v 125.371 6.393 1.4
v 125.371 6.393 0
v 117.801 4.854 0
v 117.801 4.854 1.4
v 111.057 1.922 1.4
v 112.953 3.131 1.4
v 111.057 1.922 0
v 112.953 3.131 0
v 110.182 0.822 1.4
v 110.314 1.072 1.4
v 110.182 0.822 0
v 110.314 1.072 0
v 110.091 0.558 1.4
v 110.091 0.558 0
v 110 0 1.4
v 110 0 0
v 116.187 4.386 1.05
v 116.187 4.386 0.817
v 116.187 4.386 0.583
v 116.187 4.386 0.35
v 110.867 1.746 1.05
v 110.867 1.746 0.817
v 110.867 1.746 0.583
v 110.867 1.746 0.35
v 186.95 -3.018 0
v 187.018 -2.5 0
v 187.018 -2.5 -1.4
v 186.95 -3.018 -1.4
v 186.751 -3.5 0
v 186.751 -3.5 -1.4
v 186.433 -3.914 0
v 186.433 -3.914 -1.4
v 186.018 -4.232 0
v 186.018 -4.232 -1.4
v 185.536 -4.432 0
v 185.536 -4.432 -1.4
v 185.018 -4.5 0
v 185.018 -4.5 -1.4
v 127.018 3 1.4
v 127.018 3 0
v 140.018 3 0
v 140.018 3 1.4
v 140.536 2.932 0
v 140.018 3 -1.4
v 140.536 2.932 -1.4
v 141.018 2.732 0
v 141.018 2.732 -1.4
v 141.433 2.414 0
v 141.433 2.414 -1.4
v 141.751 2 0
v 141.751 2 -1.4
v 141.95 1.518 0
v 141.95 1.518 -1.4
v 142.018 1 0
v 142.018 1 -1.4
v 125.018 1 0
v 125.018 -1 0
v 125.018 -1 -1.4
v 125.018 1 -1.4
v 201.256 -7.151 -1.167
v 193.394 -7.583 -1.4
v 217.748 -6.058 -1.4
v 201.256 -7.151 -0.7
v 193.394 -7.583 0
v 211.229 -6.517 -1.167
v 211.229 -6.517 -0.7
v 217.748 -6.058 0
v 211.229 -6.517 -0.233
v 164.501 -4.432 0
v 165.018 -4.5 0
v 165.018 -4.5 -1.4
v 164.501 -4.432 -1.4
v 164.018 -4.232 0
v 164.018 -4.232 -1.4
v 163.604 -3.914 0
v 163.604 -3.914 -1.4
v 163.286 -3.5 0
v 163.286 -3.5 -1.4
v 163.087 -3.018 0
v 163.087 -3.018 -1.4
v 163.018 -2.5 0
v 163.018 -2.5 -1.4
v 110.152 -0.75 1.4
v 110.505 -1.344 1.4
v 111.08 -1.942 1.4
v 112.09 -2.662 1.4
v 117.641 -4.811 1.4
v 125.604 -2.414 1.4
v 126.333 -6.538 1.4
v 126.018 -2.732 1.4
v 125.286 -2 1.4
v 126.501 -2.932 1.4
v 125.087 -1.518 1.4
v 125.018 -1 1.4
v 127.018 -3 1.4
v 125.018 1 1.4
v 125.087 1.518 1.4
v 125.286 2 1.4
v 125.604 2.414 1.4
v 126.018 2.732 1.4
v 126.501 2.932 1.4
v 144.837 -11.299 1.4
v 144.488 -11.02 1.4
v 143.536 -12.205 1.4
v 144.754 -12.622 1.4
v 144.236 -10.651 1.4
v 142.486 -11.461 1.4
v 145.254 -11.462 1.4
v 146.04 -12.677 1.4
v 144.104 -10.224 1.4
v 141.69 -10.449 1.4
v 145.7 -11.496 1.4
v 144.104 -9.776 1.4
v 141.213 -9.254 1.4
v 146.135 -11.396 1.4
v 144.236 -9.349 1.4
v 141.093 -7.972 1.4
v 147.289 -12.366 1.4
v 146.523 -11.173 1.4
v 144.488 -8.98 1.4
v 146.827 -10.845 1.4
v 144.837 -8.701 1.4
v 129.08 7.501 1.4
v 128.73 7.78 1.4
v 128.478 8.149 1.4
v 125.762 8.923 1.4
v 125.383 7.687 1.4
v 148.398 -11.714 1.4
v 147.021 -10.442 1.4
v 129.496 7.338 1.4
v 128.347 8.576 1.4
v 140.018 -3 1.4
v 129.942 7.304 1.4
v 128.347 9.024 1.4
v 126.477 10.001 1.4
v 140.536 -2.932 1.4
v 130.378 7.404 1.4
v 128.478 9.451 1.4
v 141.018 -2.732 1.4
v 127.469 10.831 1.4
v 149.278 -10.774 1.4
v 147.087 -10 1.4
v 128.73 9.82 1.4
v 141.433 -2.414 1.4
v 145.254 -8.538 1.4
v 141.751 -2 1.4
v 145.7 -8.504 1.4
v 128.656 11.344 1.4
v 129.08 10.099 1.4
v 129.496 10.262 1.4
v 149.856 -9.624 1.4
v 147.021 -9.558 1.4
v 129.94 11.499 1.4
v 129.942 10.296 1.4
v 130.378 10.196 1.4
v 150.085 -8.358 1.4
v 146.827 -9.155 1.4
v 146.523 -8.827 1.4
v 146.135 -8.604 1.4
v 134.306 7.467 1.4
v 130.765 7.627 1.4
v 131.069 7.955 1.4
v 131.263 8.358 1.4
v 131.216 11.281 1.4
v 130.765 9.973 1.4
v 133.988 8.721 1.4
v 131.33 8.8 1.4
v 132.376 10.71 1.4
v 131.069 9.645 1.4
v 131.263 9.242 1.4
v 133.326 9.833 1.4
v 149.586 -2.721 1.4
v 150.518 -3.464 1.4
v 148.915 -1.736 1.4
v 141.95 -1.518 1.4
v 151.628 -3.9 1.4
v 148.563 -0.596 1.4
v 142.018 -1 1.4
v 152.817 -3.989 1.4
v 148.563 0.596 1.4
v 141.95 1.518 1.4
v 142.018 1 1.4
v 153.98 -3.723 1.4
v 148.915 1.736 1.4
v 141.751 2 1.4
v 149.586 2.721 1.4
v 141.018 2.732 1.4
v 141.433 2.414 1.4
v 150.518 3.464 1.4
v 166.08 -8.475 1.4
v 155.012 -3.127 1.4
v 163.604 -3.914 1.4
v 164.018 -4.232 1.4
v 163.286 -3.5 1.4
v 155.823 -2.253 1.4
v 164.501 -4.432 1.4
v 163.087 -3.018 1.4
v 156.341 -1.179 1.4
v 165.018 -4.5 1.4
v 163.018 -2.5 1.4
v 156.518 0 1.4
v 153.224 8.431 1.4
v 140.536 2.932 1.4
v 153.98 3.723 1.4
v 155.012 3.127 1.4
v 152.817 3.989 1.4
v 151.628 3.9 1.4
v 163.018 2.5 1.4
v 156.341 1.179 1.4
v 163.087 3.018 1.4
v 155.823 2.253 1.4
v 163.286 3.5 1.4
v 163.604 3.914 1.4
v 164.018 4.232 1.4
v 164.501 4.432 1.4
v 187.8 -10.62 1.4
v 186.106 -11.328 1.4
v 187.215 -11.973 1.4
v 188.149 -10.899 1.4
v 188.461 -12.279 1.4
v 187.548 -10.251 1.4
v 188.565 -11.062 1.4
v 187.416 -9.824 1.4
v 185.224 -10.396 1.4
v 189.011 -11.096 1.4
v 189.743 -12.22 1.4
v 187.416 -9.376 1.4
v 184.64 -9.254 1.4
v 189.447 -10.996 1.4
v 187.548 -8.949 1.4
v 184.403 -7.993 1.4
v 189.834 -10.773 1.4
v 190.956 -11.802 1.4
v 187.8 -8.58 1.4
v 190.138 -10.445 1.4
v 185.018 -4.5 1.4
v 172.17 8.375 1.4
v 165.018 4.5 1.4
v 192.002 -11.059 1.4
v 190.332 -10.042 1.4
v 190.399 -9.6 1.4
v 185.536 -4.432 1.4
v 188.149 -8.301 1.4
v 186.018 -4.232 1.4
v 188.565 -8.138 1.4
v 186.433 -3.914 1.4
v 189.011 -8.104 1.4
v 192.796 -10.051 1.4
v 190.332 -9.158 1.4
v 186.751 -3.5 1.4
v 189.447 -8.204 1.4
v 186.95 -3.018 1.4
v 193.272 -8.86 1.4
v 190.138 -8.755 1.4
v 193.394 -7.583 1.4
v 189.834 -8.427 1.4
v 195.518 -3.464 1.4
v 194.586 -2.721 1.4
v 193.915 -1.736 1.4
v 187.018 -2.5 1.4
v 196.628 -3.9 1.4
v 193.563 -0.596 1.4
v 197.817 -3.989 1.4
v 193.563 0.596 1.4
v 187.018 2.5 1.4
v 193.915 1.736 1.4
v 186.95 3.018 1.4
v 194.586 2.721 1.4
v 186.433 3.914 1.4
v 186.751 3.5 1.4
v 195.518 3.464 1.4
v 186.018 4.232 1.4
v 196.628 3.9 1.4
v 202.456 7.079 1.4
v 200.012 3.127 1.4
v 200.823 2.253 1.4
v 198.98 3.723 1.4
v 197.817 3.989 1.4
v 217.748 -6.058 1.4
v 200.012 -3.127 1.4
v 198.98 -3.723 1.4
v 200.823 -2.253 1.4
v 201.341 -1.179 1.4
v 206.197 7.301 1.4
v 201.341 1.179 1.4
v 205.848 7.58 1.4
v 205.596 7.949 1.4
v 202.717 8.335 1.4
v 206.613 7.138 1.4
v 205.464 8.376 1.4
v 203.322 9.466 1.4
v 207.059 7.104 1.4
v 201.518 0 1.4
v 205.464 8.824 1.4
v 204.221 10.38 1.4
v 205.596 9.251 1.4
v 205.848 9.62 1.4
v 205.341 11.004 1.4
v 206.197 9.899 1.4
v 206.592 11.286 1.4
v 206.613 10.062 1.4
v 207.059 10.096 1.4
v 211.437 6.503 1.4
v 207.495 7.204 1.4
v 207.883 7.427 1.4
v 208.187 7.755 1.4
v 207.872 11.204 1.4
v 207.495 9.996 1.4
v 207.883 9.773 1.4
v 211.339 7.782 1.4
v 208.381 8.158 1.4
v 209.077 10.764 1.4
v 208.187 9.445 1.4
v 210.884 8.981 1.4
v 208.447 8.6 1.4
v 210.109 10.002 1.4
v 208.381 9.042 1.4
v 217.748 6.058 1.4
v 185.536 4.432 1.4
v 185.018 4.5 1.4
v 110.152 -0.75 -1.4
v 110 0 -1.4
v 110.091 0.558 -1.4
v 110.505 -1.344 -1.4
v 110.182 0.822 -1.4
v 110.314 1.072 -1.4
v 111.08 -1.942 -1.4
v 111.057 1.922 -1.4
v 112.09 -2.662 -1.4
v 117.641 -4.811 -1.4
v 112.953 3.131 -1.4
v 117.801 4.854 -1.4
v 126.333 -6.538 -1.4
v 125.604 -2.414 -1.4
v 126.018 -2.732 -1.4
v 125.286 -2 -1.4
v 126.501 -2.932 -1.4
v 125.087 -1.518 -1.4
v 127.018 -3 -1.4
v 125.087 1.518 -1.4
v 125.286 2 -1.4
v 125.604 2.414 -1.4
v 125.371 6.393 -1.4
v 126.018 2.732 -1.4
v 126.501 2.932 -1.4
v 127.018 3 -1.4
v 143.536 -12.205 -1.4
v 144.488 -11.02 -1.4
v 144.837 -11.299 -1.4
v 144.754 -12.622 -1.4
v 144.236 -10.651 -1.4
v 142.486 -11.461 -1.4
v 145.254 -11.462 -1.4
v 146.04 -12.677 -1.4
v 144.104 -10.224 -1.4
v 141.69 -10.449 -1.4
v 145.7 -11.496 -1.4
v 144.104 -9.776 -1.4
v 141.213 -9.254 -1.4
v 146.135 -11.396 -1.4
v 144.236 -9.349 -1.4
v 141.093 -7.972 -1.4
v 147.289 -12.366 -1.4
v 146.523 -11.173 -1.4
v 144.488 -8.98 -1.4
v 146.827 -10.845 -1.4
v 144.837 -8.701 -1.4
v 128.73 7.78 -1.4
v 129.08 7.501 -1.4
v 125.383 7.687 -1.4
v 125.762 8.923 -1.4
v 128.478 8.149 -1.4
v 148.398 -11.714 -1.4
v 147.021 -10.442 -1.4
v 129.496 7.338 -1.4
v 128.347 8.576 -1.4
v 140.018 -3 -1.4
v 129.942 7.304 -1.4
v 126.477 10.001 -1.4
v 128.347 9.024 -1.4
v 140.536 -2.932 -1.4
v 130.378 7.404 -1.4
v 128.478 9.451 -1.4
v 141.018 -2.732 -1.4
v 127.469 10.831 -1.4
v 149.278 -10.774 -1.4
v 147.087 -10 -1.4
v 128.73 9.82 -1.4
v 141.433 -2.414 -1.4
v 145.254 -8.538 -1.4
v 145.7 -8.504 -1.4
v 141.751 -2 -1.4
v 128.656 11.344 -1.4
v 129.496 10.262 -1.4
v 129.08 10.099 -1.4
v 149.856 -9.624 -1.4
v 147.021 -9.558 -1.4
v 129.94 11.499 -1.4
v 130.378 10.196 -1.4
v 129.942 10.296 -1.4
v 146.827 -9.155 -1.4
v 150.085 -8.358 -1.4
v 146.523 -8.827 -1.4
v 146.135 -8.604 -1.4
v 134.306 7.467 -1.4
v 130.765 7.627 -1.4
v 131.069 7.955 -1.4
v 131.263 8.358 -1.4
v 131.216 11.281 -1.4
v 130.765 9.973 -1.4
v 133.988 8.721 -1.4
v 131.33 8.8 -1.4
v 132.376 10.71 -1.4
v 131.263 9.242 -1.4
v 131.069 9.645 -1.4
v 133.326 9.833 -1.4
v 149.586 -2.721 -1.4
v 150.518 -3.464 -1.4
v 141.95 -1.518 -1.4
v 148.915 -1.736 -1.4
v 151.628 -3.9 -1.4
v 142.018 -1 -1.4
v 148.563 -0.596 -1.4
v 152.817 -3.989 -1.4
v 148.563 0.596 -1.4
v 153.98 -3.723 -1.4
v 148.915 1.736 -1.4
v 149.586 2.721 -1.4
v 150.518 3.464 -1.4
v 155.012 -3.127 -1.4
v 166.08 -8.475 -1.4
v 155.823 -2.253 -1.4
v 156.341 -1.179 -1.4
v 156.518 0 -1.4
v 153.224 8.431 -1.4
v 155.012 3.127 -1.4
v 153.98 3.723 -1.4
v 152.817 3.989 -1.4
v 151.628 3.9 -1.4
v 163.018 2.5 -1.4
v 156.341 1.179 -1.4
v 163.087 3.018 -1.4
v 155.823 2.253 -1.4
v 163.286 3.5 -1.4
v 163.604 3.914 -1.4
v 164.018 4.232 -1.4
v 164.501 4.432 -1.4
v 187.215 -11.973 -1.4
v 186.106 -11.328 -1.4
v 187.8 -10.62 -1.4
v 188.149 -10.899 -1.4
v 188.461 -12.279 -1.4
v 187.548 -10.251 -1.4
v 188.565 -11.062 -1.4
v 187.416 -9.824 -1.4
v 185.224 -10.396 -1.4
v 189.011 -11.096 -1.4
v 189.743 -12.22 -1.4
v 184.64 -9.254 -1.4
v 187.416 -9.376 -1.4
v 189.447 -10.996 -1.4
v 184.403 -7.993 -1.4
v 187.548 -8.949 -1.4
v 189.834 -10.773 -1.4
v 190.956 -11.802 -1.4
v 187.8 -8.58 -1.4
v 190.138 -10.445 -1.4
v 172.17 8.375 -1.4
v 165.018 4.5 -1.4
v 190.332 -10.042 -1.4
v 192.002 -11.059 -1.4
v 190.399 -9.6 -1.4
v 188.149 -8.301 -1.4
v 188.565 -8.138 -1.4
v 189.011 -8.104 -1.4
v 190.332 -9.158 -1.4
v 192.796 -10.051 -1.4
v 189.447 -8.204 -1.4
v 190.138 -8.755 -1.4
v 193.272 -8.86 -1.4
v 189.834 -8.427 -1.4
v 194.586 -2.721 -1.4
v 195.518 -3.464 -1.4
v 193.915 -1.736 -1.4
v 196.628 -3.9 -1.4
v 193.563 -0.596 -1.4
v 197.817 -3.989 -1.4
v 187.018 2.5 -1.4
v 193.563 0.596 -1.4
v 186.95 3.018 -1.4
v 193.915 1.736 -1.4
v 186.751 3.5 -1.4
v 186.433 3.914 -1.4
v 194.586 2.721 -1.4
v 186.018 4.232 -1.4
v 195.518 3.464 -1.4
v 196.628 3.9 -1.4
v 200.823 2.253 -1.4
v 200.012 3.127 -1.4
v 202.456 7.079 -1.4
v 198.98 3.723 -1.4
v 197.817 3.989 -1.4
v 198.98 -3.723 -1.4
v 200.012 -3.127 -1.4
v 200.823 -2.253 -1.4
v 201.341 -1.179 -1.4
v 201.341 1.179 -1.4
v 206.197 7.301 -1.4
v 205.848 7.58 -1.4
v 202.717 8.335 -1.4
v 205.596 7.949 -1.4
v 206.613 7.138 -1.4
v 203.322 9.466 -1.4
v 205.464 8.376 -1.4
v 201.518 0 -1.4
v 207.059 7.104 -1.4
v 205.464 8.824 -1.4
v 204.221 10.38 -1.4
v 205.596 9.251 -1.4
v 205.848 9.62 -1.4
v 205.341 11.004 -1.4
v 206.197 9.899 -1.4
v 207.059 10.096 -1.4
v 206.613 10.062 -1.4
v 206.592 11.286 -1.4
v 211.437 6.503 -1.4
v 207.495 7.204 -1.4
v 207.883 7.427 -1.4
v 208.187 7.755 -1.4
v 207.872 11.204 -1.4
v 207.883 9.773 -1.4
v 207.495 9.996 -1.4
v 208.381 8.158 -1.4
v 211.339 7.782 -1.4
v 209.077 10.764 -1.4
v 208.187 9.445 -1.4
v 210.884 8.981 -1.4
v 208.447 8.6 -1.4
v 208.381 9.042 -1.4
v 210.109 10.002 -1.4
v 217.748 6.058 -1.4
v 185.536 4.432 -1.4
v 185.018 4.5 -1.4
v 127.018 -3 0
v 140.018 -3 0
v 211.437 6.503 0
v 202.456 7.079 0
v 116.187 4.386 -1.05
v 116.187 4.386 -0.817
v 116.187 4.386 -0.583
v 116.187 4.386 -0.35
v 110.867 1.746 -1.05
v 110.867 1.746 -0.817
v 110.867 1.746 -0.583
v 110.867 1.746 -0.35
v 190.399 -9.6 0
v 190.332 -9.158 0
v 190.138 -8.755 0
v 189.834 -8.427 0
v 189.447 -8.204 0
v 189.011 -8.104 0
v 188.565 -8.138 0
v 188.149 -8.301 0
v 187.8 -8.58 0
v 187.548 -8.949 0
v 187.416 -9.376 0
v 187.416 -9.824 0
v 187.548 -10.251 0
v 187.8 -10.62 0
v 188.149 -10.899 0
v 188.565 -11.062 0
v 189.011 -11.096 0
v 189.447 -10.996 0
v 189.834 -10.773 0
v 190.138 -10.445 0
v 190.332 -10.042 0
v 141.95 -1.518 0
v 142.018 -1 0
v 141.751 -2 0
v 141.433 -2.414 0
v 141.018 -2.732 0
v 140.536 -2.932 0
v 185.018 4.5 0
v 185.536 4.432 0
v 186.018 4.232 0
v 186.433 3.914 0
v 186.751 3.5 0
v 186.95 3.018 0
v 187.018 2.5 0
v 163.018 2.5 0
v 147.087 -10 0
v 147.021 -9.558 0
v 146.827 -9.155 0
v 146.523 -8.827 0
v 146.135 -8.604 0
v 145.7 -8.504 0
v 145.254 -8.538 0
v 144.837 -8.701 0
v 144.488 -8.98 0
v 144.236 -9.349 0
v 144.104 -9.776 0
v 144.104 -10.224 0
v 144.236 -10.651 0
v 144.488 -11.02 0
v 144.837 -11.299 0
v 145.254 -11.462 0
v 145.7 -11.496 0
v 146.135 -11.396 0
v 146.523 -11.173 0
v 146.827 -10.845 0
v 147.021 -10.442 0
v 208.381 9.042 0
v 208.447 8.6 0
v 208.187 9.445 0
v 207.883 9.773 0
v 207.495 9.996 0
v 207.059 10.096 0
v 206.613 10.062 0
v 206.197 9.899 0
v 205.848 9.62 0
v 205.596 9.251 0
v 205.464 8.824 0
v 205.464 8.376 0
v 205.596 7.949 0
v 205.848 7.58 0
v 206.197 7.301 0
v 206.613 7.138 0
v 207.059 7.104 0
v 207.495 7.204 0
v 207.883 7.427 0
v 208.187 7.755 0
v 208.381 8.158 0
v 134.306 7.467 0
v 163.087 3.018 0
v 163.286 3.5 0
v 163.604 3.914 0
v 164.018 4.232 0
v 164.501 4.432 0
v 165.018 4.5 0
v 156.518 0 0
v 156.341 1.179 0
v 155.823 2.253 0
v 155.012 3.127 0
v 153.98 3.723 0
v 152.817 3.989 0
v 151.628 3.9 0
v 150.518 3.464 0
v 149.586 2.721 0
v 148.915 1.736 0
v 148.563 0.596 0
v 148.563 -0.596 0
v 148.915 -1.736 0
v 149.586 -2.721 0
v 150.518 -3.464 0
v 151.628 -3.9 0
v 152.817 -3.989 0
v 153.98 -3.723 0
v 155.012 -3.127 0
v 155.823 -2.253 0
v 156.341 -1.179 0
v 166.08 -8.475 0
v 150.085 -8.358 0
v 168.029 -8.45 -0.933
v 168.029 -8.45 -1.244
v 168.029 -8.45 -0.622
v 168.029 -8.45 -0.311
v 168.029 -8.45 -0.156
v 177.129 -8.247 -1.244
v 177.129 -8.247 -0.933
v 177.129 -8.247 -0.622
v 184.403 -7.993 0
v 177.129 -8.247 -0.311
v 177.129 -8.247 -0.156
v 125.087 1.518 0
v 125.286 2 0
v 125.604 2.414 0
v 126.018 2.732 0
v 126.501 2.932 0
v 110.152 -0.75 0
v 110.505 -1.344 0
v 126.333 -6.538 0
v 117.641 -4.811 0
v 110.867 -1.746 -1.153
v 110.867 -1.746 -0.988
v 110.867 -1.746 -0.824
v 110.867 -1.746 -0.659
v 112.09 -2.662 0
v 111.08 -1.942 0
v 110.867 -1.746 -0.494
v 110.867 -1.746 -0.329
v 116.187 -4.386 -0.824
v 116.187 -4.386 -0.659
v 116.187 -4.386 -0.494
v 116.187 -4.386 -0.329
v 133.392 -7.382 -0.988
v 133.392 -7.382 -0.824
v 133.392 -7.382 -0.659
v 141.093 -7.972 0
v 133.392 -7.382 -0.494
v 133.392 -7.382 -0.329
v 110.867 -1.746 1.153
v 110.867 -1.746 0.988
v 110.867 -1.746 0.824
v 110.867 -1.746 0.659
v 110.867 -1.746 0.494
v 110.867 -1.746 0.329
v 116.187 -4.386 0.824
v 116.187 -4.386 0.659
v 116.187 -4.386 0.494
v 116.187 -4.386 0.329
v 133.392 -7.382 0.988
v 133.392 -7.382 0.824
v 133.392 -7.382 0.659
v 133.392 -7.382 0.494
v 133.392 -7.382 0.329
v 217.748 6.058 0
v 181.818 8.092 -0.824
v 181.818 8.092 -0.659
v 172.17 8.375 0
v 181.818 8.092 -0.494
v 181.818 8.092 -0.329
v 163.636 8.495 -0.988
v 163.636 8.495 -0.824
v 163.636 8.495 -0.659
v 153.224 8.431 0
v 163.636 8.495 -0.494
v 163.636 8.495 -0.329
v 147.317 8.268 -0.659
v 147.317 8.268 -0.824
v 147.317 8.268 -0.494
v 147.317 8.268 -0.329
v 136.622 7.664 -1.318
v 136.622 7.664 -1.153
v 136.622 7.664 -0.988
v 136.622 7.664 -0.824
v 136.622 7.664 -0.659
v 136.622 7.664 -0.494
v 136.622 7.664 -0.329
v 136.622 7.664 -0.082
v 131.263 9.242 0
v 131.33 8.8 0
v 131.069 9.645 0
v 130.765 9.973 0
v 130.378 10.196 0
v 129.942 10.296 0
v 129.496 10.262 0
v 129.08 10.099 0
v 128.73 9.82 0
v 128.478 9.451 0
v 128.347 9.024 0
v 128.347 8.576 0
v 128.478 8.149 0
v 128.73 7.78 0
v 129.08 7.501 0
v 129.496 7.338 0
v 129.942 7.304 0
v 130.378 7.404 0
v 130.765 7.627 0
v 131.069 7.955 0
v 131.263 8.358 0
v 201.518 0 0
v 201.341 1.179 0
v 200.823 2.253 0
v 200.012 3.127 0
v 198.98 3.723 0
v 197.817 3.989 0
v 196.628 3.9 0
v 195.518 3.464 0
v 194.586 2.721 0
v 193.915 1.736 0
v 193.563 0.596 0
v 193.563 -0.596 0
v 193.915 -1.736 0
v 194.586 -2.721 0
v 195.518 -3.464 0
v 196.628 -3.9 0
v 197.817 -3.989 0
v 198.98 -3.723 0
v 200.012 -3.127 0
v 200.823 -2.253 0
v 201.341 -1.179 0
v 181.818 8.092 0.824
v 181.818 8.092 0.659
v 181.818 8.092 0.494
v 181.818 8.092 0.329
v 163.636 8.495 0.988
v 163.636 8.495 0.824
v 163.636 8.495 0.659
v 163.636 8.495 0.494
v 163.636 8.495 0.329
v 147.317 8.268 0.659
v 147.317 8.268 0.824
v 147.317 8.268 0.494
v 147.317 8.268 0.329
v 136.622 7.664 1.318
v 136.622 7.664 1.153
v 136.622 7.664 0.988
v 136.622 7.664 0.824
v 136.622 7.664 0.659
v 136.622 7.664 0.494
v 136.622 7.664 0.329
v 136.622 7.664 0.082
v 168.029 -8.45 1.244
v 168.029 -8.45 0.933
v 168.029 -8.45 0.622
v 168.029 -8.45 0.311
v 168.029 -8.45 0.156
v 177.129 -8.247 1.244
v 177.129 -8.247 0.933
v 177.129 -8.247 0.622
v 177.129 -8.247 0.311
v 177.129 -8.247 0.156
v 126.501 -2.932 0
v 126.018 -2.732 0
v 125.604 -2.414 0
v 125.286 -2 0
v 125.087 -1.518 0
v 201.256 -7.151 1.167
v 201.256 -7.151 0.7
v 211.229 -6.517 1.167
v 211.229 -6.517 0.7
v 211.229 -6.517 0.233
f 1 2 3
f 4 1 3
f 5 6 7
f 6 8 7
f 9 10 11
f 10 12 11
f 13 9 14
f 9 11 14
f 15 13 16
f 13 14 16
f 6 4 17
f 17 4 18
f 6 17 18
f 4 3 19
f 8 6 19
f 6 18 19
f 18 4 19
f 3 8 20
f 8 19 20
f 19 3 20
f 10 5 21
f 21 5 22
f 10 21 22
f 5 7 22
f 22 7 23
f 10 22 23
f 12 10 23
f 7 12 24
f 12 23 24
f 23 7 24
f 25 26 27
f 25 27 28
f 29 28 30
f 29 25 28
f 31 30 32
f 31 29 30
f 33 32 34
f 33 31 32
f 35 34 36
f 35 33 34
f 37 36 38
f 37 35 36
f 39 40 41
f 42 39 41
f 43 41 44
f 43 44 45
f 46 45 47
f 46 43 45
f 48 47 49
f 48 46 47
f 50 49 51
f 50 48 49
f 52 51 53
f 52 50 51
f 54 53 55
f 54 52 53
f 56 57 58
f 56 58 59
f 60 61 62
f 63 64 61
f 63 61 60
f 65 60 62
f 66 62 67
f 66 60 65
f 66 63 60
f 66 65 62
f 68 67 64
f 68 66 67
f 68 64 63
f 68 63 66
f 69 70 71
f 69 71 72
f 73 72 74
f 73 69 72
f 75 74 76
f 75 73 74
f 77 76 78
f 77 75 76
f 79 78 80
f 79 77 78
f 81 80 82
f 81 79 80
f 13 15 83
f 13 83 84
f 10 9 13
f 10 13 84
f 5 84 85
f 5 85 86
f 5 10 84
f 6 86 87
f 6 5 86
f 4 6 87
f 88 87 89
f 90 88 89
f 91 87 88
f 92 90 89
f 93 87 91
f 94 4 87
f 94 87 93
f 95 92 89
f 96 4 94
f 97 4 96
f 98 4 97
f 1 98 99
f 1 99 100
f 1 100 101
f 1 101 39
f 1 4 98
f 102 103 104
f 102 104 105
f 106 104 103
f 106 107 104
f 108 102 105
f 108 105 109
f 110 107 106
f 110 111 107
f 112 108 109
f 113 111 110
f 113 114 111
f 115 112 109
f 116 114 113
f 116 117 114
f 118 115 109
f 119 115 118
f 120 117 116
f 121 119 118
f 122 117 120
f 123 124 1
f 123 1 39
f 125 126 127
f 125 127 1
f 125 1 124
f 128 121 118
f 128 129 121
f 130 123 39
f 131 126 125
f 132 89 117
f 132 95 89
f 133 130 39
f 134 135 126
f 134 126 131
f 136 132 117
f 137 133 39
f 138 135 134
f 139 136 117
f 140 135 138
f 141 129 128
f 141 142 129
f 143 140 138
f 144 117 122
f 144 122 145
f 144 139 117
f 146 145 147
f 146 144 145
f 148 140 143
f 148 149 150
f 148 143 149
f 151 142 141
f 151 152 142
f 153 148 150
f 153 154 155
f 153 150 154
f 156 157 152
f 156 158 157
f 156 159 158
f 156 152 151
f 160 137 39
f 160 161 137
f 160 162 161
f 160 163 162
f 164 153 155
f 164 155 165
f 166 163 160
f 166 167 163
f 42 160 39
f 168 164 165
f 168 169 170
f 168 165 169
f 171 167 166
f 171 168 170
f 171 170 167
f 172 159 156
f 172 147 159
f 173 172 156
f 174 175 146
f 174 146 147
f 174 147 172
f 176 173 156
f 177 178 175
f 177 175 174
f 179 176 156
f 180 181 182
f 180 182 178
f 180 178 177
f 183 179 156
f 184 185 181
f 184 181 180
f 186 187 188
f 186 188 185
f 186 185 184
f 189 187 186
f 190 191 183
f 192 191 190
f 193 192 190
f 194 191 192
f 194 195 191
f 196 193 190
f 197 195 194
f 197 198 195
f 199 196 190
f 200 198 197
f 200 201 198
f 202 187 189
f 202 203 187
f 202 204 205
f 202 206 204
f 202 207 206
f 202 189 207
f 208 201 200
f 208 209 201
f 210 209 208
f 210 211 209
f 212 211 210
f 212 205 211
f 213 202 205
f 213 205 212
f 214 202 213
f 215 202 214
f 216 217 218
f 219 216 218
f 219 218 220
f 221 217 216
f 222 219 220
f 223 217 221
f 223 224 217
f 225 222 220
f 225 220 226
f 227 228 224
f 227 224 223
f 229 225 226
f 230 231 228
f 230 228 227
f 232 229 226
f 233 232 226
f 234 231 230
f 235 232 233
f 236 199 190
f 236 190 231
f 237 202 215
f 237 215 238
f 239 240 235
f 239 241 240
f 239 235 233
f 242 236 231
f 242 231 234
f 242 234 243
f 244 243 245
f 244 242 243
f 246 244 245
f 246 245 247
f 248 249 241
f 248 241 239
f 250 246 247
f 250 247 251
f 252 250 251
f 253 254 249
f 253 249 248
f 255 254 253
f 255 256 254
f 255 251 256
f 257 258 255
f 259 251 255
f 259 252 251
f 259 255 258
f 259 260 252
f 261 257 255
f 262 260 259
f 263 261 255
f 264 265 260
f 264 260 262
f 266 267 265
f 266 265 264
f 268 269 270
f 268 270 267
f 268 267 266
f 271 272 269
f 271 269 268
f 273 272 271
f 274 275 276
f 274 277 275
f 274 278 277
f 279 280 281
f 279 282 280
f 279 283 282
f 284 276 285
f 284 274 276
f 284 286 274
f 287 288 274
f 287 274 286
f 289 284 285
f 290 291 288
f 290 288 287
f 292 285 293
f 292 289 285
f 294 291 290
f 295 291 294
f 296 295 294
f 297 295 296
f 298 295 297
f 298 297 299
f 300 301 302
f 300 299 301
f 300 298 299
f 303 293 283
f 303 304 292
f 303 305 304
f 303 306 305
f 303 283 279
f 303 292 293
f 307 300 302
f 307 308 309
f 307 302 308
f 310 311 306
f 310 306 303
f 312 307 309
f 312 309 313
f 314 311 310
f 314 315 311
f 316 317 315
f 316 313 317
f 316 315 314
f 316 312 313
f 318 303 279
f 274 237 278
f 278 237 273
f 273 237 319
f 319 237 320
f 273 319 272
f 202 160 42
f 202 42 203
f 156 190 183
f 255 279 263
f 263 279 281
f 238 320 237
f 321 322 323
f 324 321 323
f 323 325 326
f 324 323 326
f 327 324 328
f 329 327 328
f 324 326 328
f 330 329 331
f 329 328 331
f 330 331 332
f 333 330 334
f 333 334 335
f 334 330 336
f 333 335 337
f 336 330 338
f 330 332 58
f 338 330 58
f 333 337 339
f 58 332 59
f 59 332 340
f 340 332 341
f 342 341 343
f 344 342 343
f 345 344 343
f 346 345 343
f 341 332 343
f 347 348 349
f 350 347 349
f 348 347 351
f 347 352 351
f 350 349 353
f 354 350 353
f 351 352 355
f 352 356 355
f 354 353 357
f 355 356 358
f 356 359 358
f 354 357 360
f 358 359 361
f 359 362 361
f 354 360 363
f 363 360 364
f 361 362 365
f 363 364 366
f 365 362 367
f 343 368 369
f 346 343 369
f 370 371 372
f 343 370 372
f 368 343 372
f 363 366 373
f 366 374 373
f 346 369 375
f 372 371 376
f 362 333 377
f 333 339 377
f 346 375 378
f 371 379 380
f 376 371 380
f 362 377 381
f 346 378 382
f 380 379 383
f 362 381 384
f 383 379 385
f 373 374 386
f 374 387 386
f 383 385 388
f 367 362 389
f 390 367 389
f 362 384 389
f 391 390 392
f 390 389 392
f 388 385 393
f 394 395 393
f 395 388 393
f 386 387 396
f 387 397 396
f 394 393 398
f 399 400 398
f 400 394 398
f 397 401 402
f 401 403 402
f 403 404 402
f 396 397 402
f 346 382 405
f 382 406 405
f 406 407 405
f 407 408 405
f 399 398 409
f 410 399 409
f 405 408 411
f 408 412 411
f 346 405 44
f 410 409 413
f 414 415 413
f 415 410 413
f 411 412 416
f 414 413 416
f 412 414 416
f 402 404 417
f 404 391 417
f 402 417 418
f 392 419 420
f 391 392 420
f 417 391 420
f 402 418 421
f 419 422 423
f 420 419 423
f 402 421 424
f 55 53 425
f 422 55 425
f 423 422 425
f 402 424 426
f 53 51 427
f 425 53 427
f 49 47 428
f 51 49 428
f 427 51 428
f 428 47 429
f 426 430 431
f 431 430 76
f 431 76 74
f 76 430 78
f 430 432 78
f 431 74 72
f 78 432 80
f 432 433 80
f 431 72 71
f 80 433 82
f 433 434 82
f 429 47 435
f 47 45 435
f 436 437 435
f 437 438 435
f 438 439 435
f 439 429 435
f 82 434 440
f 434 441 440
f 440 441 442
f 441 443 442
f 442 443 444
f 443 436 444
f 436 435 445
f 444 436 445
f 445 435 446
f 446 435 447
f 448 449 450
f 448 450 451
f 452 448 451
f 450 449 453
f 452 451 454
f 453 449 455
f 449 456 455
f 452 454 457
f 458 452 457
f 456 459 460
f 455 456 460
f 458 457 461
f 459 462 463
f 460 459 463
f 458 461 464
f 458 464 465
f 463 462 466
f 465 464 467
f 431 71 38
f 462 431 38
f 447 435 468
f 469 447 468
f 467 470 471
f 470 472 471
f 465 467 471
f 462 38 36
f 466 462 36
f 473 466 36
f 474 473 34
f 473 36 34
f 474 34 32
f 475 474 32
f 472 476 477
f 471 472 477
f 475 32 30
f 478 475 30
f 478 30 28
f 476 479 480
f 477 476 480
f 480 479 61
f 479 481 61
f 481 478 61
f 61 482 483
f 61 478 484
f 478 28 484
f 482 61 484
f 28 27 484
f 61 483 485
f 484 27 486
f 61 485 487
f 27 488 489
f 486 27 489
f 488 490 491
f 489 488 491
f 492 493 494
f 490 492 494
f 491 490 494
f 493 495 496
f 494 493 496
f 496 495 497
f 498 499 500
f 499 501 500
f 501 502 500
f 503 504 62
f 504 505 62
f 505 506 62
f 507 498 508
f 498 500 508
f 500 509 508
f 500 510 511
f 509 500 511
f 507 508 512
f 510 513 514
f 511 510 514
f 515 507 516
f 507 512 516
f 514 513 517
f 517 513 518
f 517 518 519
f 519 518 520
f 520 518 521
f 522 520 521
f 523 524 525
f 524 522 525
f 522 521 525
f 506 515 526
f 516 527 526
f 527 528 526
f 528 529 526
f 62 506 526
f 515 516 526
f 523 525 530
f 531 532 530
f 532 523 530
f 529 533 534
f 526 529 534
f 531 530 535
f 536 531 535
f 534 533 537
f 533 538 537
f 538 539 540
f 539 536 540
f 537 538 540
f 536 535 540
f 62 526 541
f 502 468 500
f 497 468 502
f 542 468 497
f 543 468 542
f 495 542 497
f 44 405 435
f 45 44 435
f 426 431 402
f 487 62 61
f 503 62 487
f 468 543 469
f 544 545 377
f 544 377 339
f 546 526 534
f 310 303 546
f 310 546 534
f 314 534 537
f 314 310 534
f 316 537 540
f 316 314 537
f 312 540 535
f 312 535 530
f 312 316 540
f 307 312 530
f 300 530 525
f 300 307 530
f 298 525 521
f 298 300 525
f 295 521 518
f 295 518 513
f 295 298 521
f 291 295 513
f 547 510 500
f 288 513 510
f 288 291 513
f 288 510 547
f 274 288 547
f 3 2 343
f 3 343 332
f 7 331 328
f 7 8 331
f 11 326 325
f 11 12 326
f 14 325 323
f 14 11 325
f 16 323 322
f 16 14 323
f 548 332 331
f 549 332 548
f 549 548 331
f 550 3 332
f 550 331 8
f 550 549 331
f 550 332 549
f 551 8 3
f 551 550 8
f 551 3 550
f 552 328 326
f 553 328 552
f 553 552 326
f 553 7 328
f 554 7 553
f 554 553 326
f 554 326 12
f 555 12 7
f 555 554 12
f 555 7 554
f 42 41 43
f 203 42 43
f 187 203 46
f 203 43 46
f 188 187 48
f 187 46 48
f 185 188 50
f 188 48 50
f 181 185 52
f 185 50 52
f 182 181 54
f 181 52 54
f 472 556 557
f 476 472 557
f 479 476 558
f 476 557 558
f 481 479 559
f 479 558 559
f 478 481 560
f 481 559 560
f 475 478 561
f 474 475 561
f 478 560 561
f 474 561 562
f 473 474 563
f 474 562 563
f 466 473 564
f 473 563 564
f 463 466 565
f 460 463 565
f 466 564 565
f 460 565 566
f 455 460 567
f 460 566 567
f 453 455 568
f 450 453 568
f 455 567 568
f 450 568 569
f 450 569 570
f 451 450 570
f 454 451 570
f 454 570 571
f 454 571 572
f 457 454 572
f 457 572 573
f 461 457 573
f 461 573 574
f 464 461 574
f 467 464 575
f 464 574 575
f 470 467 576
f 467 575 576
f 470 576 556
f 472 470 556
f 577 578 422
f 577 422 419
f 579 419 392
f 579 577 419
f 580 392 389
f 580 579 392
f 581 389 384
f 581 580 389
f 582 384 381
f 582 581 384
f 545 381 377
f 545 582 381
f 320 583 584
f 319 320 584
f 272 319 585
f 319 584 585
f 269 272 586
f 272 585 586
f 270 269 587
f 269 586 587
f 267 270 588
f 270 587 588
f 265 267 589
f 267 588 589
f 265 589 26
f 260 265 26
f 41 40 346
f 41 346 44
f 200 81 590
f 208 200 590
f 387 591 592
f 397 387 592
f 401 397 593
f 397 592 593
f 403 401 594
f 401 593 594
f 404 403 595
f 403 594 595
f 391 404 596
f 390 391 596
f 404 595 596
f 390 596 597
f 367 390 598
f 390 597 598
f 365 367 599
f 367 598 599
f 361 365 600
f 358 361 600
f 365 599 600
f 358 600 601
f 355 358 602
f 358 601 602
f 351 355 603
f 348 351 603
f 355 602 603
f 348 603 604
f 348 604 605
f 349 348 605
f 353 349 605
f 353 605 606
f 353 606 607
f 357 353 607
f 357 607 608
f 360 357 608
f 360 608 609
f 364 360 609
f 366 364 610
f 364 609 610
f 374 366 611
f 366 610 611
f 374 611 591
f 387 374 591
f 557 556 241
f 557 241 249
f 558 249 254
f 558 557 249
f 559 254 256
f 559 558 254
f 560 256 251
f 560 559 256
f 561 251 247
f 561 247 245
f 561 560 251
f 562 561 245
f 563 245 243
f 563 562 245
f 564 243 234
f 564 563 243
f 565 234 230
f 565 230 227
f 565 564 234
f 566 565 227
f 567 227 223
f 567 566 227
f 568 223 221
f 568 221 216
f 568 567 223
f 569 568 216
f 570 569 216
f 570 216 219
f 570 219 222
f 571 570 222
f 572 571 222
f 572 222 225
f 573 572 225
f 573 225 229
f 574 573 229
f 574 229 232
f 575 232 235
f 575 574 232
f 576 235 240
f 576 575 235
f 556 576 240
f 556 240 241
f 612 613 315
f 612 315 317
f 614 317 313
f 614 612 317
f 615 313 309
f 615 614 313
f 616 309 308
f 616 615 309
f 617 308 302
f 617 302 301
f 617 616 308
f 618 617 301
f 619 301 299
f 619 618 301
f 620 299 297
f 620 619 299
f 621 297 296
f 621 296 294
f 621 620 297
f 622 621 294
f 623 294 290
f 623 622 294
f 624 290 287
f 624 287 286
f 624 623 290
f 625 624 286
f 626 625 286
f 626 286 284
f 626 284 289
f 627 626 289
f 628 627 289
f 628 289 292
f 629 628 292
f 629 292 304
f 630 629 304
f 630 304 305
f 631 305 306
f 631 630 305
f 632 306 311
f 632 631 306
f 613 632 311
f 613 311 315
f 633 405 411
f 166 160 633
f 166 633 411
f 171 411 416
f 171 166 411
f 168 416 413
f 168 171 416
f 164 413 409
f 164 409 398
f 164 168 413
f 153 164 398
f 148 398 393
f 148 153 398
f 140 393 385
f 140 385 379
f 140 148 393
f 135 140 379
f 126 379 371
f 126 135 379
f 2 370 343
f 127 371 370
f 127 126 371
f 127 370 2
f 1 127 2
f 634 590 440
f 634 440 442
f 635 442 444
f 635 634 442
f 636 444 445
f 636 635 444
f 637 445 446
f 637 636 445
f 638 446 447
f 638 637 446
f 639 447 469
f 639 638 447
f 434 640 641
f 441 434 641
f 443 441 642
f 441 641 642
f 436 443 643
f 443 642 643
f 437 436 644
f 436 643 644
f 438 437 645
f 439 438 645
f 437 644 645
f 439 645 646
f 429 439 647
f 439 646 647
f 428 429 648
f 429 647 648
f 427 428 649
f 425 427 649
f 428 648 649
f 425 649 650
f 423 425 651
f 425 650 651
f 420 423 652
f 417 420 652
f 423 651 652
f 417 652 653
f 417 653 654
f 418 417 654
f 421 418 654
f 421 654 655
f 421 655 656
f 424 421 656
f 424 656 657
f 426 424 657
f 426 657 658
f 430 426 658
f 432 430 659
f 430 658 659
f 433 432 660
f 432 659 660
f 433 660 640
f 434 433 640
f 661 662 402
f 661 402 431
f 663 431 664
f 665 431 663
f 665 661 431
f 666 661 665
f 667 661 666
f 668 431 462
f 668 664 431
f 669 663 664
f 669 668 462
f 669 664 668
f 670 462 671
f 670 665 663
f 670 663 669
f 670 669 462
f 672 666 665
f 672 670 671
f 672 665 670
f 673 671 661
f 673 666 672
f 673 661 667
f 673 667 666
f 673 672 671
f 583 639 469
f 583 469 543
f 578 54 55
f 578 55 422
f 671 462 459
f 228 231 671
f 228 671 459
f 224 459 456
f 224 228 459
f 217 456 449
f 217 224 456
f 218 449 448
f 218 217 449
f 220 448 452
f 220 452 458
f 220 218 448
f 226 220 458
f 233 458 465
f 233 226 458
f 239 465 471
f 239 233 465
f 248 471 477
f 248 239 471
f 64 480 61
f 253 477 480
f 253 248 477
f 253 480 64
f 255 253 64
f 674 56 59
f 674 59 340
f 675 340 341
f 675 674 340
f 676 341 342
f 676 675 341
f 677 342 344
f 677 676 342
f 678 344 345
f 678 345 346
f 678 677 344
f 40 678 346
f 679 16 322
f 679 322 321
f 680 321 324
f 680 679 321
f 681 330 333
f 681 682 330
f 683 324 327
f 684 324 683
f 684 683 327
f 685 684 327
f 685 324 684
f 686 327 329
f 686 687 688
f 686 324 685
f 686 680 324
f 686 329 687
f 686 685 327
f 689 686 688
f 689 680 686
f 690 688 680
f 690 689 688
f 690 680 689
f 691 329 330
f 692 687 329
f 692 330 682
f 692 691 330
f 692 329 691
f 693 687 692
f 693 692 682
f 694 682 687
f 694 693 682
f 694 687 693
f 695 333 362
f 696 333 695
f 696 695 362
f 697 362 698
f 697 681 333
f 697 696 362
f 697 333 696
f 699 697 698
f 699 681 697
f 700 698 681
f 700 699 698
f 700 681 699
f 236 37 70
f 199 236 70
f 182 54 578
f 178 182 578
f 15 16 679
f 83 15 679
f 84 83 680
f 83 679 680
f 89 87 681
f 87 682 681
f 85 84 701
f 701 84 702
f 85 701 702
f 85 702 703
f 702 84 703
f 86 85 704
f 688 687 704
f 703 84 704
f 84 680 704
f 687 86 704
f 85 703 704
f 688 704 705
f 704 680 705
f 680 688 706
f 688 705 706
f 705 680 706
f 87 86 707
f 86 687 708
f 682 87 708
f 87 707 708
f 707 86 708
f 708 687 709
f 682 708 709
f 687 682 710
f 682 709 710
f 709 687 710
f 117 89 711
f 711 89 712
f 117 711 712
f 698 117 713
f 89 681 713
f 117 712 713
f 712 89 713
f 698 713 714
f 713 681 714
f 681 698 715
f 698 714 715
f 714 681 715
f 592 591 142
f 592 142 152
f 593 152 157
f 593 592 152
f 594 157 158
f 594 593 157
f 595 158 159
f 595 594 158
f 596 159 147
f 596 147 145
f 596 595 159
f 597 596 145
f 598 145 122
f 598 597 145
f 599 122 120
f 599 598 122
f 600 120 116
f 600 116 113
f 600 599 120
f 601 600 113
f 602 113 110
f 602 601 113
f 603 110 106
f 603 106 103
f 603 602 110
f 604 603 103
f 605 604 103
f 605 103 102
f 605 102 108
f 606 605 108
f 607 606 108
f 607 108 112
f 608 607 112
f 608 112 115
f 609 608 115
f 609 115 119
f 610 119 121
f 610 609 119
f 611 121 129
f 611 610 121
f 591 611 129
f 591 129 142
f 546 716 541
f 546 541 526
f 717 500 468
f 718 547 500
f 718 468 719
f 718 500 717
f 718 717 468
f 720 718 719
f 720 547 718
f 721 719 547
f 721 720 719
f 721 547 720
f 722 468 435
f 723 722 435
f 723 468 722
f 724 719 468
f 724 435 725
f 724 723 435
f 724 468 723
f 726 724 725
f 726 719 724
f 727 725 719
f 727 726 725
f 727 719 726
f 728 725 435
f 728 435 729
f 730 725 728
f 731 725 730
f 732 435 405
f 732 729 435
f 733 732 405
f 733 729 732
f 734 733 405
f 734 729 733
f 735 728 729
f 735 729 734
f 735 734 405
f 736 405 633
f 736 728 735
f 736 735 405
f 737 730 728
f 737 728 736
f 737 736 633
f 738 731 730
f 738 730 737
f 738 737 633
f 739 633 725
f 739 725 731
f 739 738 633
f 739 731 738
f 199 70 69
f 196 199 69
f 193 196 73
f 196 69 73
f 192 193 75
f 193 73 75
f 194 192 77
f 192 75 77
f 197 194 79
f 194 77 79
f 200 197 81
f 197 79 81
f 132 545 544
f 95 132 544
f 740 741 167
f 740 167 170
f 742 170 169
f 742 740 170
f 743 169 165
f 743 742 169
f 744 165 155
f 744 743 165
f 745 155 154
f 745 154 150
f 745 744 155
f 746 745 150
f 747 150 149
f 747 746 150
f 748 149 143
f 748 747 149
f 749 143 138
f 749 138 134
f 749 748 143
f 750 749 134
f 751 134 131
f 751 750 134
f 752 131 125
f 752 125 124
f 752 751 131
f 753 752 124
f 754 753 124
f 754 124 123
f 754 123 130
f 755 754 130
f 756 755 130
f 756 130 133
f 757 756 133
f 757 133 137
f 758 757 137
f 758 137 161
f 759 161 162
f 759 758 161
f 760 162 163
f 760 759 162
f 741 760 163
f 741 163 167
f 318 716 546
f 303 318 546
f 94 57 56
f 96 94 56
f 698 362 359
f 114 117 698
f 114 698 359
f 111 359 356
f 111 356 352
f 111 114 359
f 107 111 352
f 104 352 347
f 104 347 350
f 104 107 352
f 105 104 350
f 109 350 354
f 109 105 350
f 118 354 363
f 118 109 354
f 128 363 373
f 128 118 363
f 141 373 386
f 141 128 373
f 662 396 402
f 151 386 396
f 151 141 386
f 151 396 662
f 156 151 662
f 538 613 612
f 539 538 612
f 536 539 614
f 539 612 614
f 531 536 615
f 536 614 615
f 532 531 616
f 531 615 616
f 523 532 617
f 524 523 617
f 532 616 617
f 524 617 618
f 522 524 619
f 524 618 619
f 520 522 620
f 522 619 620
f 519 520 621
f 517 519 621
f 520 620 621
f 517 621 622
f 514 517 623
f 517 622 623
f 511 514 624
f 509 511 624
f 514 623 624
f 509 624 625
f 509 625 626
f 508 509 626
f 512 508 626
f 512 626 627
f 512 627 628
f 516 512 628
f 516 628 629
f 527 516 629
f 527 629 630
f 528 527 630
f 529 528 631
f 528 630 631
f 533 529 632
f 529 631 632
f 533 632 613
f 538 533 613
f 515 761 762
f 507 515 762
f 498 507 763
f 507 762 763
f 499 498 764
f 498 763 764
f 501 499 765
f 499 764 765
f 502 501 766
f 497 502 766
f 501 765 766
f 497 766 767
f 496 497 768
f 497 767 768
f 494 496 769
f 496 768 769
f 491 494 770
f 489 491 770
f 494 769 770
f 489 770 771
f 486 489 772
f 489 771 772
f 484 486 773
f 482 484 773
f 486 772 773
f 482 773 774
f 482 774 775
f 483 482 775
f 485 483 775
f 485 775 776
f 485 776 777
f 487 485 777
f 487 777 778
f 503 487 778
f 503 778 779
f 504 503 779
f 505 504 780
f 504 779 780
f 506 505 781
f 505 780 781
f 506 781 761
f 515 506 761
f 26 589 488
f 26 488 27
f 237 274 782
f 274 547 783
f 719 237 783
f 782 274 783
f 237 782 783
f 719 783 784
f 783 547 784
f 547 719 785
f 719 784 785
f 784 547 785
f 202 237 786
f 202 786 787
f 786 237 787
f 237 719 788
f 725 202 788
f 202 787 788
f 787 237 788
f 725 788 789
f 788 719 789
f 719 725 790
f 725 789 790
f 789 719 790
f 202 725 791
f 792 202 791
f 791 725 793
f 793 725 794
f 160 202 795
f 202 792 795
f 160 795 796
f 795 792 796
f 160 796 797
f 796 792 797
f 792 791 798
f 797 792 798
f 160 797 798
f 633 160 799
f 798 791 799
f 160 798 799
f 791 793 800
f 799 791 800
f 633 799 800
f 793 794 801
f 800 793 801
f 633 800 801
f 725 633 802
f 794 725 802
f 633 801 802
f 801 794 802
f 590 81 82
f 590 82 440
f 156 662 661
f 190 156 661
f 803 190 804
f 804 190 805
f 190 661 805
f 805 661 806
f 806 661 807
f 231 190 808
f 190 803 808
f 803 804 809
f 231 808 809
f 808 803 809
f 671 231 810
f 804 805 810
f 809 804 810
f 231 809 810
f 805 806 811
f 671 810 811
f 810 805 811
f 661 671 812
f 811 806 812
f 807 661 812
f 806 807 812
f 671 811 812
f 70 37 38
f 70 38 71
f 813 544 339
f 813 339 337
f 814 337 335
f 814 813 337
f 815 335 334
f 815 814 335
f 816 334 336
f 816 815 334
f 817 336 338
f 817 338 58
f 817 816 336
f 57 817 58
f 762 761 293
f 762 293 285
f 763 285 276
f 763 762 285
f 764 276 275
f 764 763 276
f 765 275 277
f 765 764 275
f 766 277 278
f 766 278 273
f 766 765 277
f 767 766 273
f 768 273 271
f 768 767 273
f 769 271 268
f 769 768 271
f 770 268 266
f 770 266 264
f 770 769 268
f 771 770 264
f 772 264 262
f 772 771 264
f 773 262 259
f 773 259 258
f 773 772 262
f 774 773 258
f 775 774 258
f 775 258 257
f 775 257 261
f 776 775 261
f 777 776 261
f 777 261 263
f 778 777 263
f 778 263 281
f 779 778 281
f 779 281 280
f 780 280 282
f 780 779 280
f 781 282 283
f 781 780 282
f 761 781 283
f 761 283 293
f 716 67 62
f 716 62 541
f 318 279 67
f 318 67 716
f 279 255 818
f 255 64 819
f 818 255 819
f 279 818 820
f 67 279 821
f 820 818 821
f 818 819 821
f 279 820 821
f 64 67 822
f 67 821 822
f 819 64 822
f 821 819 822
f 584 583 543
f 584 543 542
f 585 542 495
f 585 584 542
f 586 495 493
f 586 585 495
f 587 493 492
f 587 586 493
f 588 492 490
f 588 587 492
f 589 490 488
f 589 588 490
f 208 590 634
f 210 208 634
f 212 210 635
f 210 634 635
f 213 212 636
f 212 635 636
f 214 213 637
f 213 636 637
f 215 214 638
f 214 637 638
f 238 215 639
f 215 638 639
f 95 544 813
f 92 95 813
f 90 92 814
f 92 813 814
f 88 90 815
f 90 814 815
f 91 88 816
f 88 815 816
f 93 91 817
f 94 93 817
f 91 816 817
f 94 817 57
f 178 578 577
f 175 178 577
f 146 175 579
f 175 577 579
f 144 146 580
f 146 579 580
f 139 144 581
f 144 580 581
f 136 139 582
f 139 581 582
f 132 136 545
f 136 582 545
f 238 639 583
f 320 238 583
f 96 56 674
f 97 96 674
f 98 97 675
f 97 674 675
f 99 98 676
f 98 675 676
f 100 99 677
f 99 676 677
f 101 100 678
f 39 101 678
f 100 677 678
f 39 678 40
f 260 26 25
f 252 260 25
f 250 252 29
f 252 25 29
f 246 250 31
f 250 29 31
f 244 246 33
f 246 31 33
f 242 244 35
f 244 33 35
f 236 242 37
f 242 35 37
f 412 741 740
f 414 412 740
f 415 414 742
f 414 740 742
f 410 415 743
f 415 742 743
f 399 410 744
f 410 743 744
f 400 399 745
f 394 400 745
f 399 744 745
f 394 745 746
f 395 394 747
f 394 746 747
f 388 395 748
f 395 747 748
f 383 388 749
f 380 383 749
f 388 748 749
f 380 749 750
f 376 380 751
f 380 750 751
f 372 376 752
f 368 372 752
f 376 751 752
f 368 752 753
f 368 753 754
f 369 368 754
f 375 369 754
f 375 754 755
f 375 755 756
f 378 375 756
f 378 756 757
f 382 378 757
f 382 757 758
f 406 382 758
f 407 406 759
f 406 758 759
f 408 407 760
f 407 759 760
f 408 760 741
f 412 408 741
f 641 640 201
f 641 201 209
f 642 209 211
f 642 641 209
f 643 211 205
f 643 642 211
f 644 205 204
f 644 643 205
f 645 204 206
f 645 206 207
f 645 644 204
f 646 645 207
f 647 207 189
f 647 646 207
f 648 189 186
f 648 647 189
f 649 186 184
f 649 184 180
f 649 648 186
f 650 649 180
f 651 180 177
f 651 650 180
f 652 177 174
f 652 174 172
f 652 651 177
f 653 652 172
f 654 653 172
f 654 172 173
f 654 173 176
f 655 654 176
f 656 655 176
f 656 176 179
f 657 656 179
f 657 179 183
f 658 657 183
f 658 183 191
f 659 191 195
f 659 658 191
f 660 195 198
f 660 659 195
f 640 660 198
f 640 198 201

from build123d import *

# Parameters (mm, degrees)
SKETCH_1_R      = 1.5
SKETCH_1_R_2    = 4
EXTRUDE_1_DEPTH = 1.4


with BuildPart() as part:
    # Эскиз1 → Бобышка-Вытянуть1 (new, symmetric)
    with BuildSketch(Plane.XY):
        with BuildLine():
            Line((217.747634119, 0), (217.747634119, 6.058113078))
            add(Edge.make_bspline(
                [(217.747634119, 6.058113078), (217.243808474, 6.094887376), (215.140700226, 6.247183834), (213.037224342, 6.394367799), (211.437469318, 6.503148402)],
                knots=[0.362605011, 0.362605011, 0.362605011, 0.362605011, 0.371392651, 0.399285533, 0.399285533, 0.399285533, 0.399285533], degree=3))
            ThreePointArc((211.437469318, 6.503148402), (207.235292618, 11.29077317), (202.455940343, 7.079190122))
            add(Edge.make_bspline(
                [(202.455940343, 7.079190122), (202.056002141, 7.103223291), (200.009450225, 7.225045801), (196.331634567, 7.433105337), (191.441311474, 7.684604439), (186.608700127, 7.906218293), (181.844626933, 8.095958493), (177.159453511, 8.251957682), (172.563150272, 8.372486564), (168.065295924, 8.455953662), (163.675147454, 8.5010027), (159.401643404, 8.506522967), (155.253439756, 8.471528808), (151.238917925, 8.395506076), (147.366223919, 8.277985977), (143.643266298, 8.118975561), (140.077743555, 7.918678943), (136.982380939, 7.699243614), (135.077259612, 7.537606821), (134.305602735, 7.467259257)],
                knots=[0.451472212, 0.451472212, 0.451472212, 0.451472212, 0.458441906, 0.487136113, 0.515551917, 0.543623846, 0.571289984, 0.59849081, 0.625169613, 0.651272029, 0.676746158, 0.701541791, 0.725611017, 0.748907835, 0.771387785, 0.793008139, 0.813728033, 0.833507815, 0.846986731, 0.846986731, 0.846986731, 0.846986731], degree=3))
            ThreePointArc((134.305602735, 7.467259257), (129.292776458, 11.467825954), (125.371042184, 6.393088379))
            add(Edge.make_bspline(
                [(125.371042184, 6.393088379), (125.182557358, 6.363796993), (124.168294515, 6.203402144), (122.397158974, 5.896120566), (120.133109351, 5.434797476), (118.081312133, 4.94256764), (116.247665798, 4.421392386), (114.63793972, 3.873060465), (113.256788366, 3.299309237), (112.109835924, 2.701306387), (111.196336341, 2.078555233), (110.530223642, 1.427069758), (110.085538218, 0.73423022), (110.027578176, 0.23672144), (110, 0)],
                knots=[0.899174702, 0.899174702, 0.899174702, 0.899174702, 0.902492782, 0.917037139, 0.930441054, 0.942679762, 0.953733567, 0.963589785, 0.972247019, 0.979722225, 0.986065145, 0.991385258, 0.995900989, 1, 1, 1, 1], degree=3))
            add(Edge.make_bspline(
                [(110, 0), (110.027578176, -0.236721441), (110.085538218, -0.734230221), (110.530223642, -1.427069759), (111.196336341, -2.078555234), (112.109835924, -2.701306388), (113.256788366, -3.299309238), (114.63793972, -3.873060466), (116.247665798, -4.421392387), (118.081312133, -4.942567641), (120.133109351, -5.434797477), (122.397158974, -5.896120567), (124.867245825, -6.324666078), (127.536961089, -6.718650341), (130.399721686, -7.076424311), (133.448762895, -7.396480569), (136.677139412, -7.677604542), (139.245643336, -7.859689995), (140.736851964, -7.951317752), (141.093175889, -7.972438296)],
                knots=[0, 0, 0, 0, 0.004099011, 0.008614742, 0.013934855, 0.020277775, 0.027752981, 0.036410215, 0.046266433, 0.057320238, 0.069558946, 0.082962861, 0.097507218, 0.113164082, 0.12990269, 0.147690304, 0.166492185, 0.186271967, 0.192481252, 0.192481252, 0.192481252, 0.192481252], degree=3))
            ThreePointArc((141.093175889, -7.972438296), (145.394805922, -12.695875937), (150.084655985, -8.35765159))
            add(Edge.make_bspline(
                [(150.084655985, -8.35765159), (150.453806444, -8.367988388), (152.161758649, -8.412981849), (155.253439756, -8.471528808), (159.401643404, -8.506522967), (163.675147454, -8.5010027), (168.065295924, -8.455953663), (172.563150272, -8.372486564), (177.159453511, -8.251957682), (181.117095872, -8.120182624), (183.541473355, -8.027281081), (184.403269889, -7.992794251)],
                knots=[0.244668107, 0.244668107, 0.244668107, 0.244668107, 0.251092165, 0.274388983, 0.298458209, 0.323253842, 0.348727971, 0.374830387, 0.40150919, 0.428710016, 0.443713425, 0.443713425, 0.443713425, 0.443713425], degree=3))
            ThreePointArc((184.403269889, -7.992794251), (189.104065456, -12.29533144), (193.393900024, -7.582940899))
            add(Edge.make_bspline(
                [(193.393900024, -7.582940899), (194.367821921, -7.533422186), (196.98891626, -7.395921928), (201.268368917, -7.153826886), (206.239642946, -6.848873), (211.232977593, -6.52047435), (215.071311266, -6.252208631), (217.243808474, -6.094887376), (217.747634119, -6.058113078)],
                knots=[0.495900102, 0.495900102, 0.495900102, 0.495900102, 0.512863887, 0.541558094, 0.570462313, 0.599504248, 0.628607349, 0.637394989, 0.637394989, 0.637394989, 0.637394989], degree=3))
            Line((217.747634119, -6.058113078), (217.747634119, 0))
        make_face()
        with Locations((145.587418391, -10)):
            Circle(SKETCH_1_R, mode=Mode.SUBTRACT)
        with Locations((188.899138034, -9.6)):
            Circle(SKETCH_1_R, mode=Mode.SUBTRACT)
        with BuildLine():
            Line((140.01848428, -3), (127.01848428, -3))
            ThreePointArc((127.01848428, -3), (125.604270718, -2.414213562), (125.01848428, -1))
            Line((125.01848428, -1), (125.01848428, 1))
            ThreePointArc((125.01848428, 1), (125.604270718, 2.414213562), (127.01848428, 3))
            Line((127.01848428, 3), (140.01848428, 3))
            ThreePointArc((140.01848428, 3), (141.432697843, 2.414213562), (142.01848428, 1))
            Line((142.01848428, 1), (142.01848428, -1))
            ThreePointArc((142.01848428, -1), (141.432697843, -2.414213562), (140.01848428, -3))
        make_face(mode=Mode.SUBTRACT)
        with Locations((152.51848428, 0)):
            Circle(SKETCH_1_R_2, mode=Mode.SUBTRACT)
        with BuildLine():
            Line((185.01848428, -4.5), (165.01848428, -4.5))
            ThreePointArc((165.01848428, -4.5), (163.604270718, -3.914213562), (163.01848428, -2.5))
            Line((163.01848428, -2.5), (163.01848428, 2.5))
            ThreePointArc((163.01848428, 2.5), (163.604270718, 3.914213562), (165.01848428, 4.5))
            Line((165.01848428, 4.5), (185.01848428, 4.5))
            ThreePointArc((185.01848428, 4.5), (186.432697843, 3.914213562), (187.01848428, 2.5))
            Line((187.01848428, 2.5), (187.01848428, -2.5))
            ThreePointArc((187.01848428, -2.5), (186.432697843, -3.914213562), (185.01848428, -4.5))
        make_face(mode=Mode.SUBTRACT)
        with Locations((129.829927502, 8.8)):
            Circle(SKETCH_1_R, mode=Mode.SUBTRACT)
        with Locations((197.51848428, 0)):
            Circle(SKETCH_1_R_2, mode=Mode.SUBTRACT)
        with Locations((206.947271201, 8.6)):
            Circle(SKETCH_1_R, mode=Mode.SUBTRACT)
    extrude(amount=EXTRUDE_1_DEPTH, both=True)


solid = part.part
